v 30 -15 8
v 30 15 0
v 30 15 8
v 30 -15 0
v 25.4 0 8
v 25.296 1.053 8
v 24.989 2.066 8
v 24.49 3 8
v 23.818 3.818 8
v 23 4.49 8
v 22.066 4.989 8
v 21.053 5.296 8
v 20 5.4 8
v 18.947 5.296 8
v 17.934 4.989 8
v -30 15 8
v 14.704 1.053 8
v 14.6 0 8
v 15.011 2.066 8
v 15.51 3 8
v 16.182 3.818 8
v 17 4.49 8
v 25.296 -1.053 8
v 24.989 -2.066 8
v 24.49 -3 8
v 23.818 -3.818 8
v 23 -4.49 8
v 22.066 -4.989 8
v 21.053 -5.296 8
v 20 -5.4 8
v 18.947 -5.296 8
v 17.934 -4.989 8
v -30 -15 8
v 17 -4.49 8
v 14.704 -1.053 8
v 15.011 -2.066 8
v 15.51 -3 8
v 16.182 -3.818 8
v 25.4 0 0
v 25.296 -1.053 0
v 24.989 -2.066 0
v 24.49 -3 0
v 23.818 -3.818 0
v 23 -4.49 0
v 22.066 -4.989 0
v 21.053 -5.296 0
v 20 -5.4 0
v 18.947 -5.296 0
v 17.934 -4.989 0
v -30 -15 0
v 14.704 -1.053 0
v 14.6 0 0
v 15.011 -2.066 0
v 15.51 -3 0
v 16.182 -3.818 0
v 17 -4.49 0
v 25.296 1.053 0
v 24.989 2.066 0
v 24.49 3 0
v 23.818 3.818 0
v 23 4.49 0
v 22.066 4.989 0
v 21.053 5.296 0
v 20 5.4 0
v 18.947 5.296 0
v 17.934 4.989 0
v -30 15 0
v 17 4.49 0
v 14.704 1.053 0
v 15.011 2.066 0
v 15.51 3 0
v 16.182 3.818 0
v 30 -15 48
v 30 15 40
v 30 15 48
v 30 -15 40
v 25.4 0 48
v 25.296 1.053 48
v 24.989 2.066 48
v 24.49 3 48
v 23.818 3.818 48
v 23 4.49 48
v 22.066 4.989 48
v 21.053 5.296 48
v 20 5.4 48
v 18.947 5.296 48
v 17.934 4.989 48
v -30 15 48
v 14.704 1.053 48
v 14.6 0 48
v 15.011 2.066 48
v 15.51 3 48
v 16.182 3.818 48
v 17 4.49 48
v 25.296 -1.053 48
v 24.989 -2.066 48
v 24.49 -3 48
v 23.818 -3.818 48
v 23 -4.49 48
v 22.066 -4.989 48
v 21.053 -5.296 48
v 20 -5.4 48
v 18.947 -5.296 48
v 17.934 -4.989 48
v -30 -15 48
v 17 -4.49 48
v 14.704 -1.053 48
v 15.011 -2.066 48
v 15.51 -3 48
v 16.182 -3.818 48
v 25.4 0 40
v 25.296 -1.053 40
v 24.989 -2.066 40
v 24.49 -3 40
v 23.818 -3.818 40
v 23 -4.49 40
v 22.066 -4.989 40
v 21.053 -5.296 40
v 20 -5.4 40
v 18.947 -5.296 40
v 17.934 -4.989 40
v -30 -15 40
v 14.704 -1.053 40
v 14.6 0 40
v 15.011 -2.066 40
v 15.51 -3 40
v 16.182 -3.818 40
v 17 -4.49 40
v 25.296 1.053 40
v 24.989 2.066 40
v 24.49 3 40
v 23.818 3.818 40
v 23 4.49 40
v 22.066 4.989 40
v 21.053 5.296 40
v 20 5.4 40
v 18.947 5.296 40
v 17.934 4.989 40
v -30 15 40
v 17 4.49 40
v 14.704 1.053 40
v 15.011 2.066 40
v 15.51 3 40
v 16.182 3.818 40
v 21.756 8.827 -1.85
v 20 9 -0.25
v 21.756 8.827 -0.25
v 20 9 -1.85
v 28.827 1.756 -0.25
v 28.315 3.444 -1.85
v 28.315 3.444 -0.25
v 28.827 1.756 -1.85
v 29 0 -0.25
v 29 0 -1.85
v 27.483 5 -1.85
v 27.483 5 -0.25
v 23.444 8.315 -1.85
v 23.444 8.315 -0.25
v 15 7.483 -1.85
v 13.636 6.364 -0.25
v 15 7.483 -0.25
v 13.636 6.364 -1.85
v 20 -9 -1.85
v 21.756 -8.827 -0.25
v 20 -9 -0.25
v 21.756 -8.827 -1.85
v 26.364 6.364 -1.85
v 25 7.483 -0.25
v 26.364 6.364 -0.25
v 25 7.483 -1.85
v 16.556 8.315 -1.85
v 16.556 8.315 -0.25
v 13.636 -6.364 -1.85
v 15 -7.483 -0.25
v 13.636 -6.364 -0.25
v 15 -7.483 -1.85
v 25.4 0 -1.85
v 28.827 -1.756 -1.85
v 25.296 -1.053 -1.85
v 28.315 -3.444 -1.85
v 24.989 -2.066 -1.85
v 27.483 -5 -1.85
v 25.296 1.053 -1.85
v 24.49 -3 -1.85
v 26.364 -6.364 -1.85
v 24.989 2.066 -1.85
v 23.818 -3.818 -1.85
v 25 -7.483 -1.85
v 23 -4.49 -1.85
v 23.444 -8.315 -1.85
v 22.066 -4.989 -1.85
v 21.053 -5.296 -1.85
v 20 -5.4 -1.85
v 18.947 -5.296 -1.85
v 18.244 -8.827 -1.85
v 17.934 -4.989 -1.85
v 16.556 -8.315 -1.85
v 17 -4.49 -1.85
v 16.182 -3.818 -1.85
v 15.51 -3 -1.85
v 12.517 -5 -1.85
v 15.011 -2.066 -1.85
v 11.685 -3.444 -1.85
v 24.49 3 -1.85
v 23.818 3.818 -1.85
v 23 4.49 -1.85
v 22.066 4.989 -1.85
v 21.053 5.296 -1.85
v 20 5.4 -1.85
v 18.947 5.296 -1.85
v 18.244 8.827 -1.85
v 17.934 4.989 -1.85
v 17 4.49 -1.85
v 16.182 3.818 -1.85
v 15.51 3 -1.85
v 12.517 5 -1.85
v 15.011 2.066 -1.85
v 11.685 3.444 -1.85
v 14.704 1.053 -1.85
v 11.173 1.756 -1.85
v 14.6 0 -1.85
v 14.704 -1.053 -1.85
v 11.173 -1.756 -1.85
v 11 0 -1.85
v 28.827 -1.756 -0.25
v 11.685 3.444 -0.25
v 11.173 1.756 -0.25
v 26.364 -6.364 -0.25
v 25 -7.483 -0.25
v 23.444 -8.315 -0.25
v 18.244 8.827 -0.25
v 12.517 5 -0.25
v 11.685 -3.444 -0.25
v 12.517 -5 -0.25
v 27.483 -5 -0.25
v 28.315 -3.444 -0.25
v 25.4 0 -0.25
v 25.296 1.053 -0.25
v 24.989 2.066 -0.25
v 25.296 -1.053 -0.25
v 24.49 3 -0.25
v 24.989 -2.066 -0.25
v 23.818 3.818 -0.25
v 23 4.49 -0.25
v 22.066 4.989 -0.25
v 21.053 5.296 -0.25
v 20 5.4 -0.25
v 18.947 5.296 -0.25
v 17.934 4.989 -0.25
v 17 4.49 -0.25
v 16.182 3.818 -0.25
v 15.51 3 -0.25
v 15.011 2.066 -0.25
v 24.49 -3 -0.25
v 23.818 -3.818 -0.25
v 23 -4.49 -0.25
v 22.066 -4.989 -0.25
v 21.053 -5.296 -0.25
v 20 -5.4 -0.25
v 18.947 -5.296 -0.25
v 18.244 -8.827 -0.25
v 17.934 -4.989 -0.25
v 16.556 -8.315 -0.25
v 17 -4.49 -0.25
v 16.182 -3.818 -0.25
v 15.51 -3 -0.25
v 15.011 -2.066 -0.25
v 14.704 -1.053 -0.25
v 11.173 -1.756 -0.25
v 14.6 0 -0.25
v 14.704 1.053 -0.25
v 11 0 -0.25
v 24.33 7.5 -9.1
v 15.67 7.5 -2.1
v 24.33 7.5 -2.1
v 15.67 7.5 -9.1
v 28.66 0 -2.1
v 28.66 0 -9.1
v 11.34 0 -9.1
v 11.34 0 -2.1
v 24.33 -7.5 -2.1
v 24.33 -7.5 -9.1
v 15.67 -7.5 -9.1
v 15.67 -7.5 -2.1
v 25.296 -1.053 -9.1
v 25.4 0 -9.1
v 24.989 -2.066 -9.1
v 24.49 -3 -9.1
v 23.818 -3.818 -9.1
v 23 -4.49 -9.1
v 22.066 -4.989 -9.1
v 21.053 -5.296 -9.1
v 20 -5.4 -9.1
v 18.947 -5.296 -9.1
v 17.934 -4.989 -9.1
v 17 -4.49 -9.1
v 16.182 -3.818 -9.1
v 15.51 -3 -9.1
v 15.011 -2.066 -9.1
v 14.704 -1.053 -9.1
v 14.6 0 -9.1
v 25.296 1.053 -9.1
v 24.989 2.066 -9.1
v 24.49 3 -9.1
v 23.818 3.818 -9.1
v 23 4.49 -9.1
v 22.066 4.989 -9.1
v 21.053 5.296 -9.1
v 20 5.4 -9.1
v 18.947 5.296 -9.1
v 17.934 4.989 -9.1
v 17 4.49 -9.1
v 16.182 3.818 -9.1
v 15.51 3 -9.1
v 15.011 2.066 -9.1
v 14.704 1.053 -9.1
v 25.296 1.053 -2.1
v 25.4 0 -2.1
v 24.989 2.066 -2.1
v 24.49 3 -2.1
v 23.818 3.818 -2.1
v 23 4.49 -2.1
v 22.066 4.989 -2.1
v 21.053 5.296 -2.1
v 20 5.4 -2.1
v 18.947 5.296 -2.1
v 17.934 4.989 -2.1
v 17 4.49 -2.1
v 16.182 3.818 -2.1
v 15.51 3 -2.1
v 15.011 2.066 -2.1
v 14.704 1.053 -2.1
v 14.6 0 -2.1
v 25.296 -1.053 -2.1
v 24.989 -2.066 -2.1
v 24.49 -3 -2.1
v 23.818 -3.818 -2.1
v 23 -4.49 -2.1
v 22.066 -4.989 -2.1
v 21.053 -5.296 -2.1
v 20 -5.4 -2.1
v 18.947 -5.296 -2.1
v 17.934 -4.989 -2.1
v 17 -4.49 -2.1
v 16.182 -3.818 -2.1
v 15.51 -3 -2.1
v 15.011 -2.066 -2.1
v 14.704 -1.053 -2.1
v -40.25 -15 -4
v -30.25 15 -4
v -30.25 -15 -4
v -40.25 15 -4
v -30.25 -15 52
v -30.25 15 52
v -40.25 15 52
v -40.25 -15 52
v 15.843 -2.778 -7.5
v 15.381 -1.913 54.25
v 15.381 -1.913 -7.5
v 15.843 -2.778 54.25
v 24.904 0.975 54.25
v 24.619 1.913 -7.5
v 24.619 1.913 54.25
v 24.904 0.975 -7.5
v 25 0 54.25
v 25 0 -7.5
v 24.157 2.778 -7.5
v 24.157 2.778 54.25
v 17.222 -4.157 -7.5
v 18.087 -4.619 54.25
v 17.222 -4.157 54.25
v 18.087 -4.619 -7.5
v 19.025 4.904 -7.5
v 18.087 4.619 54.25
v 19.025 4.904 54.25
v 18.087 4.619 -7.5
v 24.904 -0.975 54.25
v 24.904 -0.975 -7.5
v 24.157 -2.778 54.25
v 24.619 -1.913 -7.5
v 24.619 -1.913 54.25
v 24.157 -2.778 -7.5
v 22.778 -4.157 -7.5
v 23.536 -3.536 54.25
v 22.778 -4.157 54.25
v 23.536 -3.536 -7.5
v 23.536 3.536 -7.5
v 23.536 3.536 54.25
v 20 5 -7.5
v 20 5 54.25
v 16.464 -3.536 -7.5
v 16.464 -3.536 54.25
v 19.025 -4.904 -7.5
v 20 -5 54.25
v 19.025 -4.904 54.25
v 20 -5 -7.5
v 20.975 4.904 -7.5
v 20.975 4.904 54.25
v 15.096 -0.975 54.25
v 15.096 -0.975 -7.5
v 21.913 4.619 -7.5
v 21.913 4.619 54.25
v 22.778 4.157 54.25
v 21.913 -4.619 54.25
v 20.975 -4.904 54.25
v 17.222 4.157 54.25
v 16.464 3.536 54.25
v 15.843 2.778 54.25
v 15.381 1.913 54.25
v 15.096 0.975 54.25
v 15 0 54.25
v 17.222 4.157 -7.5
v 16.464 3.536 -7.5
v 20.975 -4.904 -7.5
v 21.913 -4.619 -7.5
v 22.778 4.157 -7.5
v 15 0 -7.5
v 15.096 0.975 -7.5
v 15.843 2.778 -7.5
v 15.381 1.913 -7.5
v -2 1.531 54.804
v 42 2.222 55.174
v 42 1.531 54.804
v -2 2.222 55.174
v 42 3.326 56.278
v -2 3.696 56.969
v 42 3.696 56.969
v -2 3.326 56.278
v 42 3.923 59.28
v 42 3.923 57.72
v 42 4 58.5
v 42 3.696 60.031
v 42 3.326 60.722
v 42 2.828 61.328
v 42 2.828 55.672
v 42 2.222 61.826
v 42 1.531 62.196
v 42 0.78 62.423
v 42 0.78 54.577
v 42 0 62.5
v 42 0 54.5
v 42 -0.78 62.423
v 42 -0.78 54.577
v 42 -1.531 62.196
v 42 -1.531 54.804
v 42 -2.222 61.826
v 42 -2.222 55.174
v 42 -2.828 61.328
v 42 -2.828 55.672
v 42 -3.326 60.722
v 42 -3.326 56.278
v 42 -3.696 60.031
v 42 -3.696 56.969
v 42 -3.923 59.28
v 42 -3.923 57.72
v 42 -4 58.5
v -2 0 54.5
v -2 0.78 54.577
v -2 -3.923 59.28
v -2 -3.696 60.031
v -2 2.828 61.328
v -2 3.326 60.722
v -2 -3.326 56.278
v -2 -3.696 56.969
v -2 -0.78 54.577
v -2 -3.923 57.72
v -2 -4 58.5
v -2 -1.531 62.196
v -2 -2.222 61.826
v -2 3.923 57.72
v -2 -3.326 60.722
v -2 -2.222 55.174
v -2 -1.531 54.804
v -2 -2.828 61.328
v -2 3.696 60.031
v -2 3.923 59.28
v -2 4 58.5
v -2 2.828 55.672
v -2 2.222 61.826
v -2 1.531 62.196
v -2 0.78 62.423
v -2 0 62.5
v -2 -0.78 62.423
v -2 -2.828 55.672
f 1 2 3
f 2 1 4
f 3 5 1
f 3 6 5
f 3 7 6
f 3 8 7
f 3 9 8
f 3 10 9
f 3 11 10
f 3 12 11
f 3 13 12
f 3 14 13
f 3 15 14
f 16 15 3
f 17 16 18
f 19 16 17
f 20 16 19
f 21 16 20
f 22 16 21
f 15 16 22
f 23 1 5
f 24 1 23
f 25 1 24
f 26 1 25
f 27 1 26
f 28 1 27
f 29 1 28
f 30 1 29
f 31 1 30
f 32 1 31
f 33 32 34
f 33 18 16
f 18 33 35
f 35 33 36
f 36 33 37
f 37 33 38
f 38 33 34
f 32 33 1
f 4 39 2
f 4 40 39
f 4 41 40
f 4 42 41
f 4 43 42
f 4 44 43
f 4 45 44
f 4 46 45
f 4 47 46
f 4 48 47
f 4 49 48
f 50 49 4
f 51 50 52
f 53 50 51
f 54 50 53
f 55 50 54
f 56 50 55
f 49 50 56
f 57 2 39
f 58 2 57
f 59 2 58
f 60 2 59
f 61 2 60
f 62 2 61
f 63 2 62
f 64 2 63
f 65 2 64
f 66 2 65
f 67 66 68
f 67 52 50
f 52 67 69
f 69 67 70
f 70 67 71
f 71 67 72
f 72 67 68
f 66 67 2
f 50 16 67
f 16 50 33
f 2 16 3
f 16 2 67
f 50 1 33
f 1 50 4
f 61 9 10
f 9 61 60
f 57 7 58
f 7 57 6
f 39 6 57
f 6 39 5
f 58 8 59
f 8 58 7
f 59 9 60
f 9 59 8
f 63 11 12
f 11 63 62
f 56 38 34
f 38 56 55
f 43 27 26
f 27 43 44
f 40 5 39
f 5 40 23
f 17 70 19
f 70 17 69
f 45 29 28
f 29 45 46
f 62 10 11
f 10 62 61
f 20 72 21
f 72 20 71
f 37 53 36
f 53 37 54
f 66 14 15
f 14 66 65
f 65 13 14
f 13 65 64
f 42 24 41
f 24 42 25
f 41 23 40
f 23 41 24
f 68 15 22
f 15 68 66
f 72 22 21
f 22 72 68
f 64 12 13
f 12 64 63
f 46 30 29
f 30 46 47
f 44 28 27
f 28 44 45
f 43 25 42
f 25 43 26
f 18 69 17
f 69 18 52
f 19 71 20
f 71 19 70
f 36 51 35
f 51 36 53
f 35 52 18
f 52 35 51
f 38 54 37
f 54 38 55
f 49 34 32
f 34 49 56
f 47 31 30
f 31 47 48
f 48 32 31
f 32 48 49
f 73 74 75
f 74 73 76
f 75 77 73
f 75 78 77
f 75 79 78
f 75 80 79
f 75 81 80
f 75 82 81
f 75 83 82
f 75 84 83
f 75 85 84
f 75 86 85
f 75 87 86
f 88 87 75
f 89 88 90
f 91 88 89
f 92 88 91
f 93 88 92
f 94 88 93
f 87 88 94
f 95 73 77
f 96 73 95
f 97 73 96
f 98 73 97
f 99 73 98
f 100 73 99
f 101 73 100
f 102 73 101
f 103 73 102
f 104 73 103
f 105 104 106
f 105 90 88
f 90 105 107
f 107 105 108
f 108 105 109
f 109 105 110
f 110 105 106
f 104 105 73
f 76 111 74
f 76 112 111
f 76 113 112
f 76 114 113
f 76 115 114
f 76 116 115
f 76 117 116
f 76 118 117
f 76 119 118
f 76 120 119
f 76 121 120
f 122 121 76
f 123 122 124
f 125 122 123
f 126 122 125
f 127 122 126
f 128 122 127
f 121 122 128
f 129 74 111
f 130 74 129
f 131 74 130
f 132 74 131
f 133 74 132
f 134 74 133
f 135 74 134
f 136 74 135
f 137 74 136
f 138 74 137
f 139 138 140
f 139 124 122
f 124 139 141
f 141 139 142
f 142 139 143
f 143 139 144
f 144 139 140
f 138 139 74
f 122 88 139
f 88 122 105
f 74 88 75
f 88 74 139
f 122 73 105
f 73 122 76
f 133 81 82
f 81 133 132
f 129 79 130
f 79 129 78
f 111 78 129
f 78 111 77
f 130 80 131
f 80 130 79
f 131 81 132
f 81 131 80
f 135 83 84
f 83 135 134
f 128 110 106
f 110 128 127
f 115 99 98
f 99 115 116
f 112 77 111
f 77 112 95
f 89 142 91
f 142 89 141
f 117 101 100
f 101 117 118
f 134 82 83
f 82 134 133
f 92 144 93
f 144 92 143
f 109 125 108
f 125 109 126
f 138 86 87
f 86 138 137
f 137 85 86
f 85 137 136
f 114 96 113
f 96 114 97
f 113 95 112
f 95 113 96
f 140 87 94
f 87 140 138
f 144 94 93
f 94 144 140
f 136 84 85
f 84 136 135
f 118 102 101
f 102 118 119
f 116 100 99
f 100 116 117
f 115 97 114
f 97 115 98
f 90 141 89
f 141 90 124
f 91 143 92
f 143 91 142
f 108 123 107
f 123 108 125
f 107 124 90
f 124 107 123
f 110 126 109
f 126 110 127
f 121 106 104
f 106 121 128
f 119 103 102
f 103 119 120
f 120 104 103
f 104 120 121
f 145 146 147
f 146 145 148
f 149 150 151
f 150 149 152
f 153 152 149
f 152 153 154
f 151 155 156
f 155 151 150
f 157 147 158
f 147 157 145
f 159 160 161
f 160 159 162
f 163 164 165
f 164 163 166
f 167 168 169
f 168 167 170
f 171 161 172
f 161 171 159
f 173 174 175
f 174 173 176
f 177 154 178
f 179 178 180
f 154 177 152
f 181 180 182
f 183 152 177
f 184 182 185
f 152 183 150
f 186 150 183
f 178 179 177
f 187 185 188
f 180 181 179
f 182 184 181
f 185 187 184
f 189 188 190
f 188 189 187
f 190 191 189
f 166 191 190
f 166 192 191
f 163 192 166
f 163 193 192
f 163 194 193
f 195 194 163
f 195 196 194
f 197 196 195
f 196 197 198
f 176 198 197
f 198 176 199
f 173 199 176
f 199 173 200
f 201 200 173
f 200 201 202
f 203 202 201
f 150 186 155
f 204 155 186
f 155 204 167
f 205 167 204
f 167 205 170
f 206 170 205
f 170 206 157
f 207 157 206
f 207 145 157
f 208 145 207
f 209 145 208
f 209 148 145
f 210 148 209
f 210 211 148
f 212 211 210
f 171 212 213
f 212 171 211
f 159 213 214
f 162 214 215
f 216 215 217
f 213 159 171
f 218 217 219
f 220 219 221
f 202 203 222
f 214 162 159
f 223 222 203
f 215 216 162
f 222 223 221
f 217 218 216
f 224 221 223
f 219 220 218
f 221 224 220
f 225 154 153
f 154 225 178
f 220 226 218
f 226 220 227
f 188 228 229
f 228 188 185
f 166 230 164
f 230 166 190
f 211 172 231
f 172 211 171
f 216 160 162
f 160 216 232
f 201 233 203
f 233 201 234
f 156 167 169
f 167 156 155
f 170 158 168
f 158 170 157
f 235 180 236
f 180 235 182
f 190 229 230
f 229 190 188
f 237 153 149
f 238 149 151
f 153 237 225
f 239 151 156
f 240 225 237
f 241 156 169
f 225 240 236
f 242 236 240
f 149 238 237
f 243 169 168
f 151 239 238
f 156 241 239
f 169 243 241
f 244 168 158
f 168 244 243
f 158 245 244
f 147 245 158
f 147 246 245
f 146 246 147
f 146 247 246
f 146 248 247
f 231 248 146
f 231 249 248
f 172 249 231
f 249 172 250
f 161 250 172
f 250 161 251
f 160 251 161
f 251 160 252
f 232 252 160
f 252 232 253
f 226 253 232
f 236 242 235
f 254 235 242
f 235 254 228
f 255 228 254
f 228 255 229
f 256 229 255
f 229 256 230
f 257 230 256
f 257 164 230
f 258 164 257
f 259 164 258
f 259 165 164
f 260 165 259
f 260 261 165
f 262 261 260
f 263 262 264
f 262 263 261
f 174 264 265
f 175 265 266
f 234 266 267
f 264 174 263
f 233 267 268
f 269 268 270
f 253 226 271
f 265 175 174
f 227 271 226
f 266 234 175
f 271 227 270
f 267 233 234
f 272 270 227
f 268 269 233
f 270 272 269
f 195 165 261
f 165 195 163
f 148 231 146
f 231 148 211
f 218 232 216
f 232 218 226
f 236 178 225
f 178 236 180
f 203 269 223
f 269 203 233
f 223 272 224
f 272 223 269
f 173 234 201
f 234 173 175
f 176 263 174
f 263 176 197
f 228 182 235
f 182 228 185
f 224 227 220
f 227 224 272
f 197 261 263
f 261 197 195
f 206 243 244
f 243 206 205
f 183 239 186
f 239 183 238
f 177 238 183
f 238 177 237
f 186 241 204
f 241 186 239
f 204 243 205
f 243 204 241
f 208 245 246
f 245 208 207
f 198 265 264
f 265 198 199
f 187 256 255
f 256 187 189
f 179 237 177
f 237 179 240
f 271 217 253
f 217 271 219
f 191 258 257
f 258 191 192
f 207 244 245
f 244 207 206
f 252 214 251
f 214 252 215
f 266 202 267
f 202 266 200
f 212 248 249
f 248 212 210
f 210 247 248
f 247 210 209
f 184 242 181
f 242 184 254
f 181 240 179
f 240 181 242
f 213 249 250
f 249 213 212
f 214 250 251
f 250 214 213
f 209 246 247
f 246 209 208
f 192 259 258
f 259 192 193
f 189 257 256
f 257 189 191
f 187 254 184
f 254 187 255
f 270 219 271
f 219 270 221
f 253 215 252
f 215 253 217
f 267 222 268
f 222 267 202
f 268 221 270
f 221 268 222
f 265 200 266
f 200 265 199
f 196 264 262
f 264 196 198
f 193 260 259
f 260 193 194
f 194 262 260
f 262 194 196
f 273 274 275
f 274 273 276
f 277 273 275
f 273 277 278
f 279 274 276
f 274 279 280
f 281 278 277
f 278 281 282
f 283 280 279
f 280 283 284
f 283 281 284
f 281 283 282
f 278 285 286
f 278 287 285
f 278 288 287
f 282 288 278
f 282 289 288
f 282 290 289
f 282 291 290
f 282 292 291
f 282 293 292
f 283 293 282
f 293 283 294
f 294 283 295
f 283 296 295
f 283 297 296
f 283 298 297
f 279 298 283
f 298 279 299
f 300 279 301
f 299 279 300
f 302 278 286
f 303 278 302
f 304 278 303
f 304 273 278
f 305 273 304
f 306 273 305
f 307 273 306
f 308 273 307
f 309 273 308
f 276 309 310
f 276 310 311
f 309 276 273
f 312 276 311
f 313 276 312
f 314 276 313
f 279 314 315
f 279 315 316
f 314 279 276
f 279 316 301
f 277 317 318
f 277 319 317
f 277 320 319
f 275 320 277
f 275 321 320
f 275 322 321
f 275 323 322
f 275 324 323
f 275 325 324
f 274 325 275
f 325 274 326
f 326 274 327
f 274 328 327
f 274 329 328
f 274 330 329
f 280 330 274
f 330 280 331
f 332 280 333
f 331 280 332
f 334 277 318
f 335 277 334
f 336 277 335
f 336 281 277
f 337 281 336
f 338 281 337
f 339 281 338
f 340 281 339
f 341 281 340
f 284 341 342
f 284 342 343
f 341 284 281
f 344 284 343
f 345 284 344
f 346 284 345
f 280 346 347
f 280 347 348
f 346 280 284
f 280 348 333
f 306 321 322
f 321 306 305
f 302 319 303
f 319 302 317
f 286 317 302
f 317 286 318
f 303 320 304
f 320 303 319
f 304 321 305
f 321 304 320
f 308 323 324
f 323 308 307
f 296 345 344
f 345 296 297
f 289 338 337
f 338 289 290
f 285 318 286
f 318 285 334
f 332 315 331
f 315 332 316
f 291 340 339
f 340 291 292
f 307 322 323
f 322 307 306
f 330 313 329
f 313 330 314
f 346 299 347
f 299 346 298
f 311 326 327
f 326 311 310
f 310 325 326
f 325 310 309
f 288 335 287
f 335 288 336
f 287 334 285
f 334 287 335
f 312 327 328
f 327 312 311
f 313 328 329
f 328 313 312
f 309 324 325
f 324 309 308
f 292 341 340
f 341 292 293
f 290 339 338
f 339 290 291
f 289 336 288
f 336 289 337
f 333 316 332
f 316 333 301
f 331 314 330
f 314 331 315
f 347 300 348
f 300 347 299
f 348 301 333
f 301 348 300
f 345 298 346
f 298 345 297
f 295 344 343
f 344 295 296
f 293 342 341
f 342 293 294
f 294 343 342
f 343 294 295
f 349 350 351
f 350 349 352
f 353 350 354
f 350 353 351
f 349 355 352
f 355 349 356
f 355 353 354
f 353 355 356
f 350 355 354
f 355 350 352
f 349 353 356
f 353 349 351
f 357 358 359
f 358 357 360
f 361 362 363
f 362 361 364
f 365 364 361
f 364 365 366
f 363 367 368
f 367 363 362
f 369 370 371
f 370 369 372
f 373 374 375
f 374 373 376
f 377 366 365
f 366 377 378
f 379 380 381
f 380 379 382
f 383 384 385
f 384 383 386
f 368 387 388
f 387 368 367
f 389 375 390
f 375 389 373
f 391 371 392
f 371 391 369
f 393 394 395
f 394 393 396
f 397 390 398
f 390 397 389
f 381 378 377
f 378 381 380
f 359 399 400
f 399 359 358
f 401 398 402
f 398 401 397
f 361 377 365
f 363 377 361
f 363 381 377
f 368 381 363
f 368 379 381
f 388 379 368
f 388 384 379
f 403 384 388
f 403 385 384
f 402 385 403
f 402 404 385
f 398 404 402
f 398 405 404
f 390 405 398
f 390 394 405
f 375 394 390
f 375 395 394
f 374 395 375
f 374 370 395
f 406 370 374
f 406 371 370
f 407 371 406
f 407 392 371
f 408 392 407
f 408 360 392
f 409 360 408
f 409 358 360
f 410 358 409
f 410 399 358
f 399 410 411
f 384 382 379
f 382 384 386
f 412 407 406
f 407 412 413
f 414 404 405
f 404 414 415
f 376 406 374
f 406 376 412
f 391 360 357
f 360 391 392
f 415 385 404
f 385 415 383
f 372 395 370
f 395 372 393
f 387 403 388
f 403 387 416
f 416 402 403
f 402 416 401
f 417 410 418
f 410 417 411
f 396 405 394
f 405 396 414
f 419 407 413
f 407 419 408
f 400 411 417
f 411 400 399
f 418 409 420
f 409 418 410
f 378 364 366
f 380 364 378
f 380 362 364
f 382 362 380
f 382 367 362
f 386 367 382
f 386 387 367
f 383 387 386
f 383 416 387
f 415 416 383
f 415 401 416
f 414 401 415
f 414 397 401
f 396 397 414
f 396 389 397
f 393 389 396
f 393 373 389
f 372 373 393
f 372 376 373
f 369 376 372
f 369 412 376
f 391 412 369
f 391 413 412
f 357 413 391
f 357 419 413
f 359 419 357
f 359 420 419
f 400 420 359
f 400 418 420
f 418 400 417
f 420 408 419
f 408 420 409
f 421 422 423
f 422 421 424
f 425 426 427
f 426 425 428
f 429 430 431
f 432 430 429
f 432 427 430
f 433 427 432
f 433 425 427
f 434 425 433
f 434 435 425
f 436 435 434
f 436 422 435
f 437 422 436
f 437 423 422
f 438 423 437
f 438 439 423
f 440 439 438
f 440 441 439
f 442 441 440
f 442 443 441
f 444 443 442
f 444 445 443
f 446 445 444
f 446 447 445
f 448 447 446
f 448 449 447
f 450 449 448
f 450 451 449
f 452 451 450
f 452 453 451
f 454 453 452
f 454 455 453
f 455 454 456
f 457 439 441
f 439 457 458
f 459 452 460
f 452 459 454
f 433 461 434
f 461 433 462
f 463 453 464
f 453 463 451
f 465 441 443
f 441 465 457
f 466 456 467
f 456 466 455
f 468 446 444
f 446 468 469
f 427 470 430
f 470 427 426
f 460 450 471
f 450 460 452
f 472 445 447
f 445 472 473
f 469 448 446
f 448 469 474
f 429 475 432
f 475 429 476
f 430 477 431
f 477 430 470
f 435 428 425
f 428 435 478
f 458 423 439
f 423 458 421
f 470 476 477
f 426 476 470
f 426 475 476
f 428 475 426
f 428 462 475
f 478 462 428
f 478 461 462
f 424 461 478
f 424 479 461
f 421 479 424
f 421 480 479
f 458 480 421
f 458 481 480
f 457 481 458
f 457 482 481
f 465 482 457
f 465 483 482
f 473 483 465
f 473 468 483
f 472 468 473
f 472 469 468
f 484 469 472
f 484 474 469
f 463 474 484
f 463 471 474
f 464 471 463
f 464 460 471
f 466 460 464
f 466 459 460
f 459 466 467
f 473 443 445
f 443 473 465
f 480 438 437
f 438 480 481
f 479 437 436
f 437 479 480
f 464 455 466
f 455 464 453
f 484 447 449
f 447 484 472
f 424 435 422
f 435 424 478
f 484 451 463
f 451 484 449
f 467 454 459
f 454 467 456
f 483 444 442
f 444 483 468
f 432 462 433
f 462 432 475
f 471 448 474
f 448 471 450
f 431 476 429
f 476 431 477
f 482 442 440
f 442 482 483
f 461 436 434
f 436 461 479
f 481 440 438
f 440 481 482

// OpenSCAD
$fn = 32;

// ------------------------------------------------------------------------
// C clamp: throat 40 mm, screw d10
// Every part is its own module, assembly() places every instance.
// ------------------------------------------------------------------------

// --- part 1 ---
module clamp_arm() {
  difference() {
    translate([-30, -15, 0]) cube([60, 30, 8]);
    translate([20, 0, -1]) cylinder(h = 10, d = 10.8);
  }
}

// --- part 2 ---
module clamp_spine() {
  difference() {
    translate([-28, -15, 0]) cube([56, 30, 10]);
  }
}

// --- part 3 ---
module clamp_screw() {
  translate([0, 0, -30.875]) cylinder(h = 61.75, d = 10);
}

// --- part 4 ---
module clamp_washer() {
  difference() {
      translate([0, 0, 0]) cylinder(h = 1.6, d = 18);
      translate([0, 0, -1]) cylinder(h = 3.6, d = 10.8);
    }
}

// --- part 5 ---
module clamp_nut() {
  difference() {
    linear_extrude(height = 7) polygon(points = [[8.66, 0], [4.33, 7.5], [-4.33, 7.5], [-8.66, 0], [-4.33, -7.5], [4.33, -7.5]]);
    translate([0, 0, -1]) cylinder(h = 9, d = 10.8);
  }
}

// --- part 6 ---
module tommy_bar() {
  translate([0, 0, -22]) cylinder(h = 44, d = 8);
}

// --- assembly ---
module assembly() {
  color([0.80, 0.24, 0.20]) translate([0, 0, 0]) rotate([0, 0, 0]) clamp_arm();
  color([0.20, 0.45, 0.75]) translate([0, 0, 40]) rotate([0, 0, 0]) clamp_arm();
  color([0.25, 0.62, 0.32]) translate([-40.25, 0, 24]) rotate([0, 90, 0]) clamp_spine();
  color([0.92, 0.70, 0.18]) translate([20, 0, 23.375]) rotate([0, 0, 0]) clamp_screw();
  color([0.58, 0.35, 0.70]) translate([20, 0, -1.85]) rotate([0, 0, 0]) clamp_washer();
  color([0.16, 0.66, 0.66]) translate([20, 0, -9.1]) rotate([0, 0, 0]) clamp_nut();
  color([0.85, 0.48, 0.18]) translate([20, 0, 58.5]) rotate([0, 90, 0]) tommy_bar();
}

assembly();
